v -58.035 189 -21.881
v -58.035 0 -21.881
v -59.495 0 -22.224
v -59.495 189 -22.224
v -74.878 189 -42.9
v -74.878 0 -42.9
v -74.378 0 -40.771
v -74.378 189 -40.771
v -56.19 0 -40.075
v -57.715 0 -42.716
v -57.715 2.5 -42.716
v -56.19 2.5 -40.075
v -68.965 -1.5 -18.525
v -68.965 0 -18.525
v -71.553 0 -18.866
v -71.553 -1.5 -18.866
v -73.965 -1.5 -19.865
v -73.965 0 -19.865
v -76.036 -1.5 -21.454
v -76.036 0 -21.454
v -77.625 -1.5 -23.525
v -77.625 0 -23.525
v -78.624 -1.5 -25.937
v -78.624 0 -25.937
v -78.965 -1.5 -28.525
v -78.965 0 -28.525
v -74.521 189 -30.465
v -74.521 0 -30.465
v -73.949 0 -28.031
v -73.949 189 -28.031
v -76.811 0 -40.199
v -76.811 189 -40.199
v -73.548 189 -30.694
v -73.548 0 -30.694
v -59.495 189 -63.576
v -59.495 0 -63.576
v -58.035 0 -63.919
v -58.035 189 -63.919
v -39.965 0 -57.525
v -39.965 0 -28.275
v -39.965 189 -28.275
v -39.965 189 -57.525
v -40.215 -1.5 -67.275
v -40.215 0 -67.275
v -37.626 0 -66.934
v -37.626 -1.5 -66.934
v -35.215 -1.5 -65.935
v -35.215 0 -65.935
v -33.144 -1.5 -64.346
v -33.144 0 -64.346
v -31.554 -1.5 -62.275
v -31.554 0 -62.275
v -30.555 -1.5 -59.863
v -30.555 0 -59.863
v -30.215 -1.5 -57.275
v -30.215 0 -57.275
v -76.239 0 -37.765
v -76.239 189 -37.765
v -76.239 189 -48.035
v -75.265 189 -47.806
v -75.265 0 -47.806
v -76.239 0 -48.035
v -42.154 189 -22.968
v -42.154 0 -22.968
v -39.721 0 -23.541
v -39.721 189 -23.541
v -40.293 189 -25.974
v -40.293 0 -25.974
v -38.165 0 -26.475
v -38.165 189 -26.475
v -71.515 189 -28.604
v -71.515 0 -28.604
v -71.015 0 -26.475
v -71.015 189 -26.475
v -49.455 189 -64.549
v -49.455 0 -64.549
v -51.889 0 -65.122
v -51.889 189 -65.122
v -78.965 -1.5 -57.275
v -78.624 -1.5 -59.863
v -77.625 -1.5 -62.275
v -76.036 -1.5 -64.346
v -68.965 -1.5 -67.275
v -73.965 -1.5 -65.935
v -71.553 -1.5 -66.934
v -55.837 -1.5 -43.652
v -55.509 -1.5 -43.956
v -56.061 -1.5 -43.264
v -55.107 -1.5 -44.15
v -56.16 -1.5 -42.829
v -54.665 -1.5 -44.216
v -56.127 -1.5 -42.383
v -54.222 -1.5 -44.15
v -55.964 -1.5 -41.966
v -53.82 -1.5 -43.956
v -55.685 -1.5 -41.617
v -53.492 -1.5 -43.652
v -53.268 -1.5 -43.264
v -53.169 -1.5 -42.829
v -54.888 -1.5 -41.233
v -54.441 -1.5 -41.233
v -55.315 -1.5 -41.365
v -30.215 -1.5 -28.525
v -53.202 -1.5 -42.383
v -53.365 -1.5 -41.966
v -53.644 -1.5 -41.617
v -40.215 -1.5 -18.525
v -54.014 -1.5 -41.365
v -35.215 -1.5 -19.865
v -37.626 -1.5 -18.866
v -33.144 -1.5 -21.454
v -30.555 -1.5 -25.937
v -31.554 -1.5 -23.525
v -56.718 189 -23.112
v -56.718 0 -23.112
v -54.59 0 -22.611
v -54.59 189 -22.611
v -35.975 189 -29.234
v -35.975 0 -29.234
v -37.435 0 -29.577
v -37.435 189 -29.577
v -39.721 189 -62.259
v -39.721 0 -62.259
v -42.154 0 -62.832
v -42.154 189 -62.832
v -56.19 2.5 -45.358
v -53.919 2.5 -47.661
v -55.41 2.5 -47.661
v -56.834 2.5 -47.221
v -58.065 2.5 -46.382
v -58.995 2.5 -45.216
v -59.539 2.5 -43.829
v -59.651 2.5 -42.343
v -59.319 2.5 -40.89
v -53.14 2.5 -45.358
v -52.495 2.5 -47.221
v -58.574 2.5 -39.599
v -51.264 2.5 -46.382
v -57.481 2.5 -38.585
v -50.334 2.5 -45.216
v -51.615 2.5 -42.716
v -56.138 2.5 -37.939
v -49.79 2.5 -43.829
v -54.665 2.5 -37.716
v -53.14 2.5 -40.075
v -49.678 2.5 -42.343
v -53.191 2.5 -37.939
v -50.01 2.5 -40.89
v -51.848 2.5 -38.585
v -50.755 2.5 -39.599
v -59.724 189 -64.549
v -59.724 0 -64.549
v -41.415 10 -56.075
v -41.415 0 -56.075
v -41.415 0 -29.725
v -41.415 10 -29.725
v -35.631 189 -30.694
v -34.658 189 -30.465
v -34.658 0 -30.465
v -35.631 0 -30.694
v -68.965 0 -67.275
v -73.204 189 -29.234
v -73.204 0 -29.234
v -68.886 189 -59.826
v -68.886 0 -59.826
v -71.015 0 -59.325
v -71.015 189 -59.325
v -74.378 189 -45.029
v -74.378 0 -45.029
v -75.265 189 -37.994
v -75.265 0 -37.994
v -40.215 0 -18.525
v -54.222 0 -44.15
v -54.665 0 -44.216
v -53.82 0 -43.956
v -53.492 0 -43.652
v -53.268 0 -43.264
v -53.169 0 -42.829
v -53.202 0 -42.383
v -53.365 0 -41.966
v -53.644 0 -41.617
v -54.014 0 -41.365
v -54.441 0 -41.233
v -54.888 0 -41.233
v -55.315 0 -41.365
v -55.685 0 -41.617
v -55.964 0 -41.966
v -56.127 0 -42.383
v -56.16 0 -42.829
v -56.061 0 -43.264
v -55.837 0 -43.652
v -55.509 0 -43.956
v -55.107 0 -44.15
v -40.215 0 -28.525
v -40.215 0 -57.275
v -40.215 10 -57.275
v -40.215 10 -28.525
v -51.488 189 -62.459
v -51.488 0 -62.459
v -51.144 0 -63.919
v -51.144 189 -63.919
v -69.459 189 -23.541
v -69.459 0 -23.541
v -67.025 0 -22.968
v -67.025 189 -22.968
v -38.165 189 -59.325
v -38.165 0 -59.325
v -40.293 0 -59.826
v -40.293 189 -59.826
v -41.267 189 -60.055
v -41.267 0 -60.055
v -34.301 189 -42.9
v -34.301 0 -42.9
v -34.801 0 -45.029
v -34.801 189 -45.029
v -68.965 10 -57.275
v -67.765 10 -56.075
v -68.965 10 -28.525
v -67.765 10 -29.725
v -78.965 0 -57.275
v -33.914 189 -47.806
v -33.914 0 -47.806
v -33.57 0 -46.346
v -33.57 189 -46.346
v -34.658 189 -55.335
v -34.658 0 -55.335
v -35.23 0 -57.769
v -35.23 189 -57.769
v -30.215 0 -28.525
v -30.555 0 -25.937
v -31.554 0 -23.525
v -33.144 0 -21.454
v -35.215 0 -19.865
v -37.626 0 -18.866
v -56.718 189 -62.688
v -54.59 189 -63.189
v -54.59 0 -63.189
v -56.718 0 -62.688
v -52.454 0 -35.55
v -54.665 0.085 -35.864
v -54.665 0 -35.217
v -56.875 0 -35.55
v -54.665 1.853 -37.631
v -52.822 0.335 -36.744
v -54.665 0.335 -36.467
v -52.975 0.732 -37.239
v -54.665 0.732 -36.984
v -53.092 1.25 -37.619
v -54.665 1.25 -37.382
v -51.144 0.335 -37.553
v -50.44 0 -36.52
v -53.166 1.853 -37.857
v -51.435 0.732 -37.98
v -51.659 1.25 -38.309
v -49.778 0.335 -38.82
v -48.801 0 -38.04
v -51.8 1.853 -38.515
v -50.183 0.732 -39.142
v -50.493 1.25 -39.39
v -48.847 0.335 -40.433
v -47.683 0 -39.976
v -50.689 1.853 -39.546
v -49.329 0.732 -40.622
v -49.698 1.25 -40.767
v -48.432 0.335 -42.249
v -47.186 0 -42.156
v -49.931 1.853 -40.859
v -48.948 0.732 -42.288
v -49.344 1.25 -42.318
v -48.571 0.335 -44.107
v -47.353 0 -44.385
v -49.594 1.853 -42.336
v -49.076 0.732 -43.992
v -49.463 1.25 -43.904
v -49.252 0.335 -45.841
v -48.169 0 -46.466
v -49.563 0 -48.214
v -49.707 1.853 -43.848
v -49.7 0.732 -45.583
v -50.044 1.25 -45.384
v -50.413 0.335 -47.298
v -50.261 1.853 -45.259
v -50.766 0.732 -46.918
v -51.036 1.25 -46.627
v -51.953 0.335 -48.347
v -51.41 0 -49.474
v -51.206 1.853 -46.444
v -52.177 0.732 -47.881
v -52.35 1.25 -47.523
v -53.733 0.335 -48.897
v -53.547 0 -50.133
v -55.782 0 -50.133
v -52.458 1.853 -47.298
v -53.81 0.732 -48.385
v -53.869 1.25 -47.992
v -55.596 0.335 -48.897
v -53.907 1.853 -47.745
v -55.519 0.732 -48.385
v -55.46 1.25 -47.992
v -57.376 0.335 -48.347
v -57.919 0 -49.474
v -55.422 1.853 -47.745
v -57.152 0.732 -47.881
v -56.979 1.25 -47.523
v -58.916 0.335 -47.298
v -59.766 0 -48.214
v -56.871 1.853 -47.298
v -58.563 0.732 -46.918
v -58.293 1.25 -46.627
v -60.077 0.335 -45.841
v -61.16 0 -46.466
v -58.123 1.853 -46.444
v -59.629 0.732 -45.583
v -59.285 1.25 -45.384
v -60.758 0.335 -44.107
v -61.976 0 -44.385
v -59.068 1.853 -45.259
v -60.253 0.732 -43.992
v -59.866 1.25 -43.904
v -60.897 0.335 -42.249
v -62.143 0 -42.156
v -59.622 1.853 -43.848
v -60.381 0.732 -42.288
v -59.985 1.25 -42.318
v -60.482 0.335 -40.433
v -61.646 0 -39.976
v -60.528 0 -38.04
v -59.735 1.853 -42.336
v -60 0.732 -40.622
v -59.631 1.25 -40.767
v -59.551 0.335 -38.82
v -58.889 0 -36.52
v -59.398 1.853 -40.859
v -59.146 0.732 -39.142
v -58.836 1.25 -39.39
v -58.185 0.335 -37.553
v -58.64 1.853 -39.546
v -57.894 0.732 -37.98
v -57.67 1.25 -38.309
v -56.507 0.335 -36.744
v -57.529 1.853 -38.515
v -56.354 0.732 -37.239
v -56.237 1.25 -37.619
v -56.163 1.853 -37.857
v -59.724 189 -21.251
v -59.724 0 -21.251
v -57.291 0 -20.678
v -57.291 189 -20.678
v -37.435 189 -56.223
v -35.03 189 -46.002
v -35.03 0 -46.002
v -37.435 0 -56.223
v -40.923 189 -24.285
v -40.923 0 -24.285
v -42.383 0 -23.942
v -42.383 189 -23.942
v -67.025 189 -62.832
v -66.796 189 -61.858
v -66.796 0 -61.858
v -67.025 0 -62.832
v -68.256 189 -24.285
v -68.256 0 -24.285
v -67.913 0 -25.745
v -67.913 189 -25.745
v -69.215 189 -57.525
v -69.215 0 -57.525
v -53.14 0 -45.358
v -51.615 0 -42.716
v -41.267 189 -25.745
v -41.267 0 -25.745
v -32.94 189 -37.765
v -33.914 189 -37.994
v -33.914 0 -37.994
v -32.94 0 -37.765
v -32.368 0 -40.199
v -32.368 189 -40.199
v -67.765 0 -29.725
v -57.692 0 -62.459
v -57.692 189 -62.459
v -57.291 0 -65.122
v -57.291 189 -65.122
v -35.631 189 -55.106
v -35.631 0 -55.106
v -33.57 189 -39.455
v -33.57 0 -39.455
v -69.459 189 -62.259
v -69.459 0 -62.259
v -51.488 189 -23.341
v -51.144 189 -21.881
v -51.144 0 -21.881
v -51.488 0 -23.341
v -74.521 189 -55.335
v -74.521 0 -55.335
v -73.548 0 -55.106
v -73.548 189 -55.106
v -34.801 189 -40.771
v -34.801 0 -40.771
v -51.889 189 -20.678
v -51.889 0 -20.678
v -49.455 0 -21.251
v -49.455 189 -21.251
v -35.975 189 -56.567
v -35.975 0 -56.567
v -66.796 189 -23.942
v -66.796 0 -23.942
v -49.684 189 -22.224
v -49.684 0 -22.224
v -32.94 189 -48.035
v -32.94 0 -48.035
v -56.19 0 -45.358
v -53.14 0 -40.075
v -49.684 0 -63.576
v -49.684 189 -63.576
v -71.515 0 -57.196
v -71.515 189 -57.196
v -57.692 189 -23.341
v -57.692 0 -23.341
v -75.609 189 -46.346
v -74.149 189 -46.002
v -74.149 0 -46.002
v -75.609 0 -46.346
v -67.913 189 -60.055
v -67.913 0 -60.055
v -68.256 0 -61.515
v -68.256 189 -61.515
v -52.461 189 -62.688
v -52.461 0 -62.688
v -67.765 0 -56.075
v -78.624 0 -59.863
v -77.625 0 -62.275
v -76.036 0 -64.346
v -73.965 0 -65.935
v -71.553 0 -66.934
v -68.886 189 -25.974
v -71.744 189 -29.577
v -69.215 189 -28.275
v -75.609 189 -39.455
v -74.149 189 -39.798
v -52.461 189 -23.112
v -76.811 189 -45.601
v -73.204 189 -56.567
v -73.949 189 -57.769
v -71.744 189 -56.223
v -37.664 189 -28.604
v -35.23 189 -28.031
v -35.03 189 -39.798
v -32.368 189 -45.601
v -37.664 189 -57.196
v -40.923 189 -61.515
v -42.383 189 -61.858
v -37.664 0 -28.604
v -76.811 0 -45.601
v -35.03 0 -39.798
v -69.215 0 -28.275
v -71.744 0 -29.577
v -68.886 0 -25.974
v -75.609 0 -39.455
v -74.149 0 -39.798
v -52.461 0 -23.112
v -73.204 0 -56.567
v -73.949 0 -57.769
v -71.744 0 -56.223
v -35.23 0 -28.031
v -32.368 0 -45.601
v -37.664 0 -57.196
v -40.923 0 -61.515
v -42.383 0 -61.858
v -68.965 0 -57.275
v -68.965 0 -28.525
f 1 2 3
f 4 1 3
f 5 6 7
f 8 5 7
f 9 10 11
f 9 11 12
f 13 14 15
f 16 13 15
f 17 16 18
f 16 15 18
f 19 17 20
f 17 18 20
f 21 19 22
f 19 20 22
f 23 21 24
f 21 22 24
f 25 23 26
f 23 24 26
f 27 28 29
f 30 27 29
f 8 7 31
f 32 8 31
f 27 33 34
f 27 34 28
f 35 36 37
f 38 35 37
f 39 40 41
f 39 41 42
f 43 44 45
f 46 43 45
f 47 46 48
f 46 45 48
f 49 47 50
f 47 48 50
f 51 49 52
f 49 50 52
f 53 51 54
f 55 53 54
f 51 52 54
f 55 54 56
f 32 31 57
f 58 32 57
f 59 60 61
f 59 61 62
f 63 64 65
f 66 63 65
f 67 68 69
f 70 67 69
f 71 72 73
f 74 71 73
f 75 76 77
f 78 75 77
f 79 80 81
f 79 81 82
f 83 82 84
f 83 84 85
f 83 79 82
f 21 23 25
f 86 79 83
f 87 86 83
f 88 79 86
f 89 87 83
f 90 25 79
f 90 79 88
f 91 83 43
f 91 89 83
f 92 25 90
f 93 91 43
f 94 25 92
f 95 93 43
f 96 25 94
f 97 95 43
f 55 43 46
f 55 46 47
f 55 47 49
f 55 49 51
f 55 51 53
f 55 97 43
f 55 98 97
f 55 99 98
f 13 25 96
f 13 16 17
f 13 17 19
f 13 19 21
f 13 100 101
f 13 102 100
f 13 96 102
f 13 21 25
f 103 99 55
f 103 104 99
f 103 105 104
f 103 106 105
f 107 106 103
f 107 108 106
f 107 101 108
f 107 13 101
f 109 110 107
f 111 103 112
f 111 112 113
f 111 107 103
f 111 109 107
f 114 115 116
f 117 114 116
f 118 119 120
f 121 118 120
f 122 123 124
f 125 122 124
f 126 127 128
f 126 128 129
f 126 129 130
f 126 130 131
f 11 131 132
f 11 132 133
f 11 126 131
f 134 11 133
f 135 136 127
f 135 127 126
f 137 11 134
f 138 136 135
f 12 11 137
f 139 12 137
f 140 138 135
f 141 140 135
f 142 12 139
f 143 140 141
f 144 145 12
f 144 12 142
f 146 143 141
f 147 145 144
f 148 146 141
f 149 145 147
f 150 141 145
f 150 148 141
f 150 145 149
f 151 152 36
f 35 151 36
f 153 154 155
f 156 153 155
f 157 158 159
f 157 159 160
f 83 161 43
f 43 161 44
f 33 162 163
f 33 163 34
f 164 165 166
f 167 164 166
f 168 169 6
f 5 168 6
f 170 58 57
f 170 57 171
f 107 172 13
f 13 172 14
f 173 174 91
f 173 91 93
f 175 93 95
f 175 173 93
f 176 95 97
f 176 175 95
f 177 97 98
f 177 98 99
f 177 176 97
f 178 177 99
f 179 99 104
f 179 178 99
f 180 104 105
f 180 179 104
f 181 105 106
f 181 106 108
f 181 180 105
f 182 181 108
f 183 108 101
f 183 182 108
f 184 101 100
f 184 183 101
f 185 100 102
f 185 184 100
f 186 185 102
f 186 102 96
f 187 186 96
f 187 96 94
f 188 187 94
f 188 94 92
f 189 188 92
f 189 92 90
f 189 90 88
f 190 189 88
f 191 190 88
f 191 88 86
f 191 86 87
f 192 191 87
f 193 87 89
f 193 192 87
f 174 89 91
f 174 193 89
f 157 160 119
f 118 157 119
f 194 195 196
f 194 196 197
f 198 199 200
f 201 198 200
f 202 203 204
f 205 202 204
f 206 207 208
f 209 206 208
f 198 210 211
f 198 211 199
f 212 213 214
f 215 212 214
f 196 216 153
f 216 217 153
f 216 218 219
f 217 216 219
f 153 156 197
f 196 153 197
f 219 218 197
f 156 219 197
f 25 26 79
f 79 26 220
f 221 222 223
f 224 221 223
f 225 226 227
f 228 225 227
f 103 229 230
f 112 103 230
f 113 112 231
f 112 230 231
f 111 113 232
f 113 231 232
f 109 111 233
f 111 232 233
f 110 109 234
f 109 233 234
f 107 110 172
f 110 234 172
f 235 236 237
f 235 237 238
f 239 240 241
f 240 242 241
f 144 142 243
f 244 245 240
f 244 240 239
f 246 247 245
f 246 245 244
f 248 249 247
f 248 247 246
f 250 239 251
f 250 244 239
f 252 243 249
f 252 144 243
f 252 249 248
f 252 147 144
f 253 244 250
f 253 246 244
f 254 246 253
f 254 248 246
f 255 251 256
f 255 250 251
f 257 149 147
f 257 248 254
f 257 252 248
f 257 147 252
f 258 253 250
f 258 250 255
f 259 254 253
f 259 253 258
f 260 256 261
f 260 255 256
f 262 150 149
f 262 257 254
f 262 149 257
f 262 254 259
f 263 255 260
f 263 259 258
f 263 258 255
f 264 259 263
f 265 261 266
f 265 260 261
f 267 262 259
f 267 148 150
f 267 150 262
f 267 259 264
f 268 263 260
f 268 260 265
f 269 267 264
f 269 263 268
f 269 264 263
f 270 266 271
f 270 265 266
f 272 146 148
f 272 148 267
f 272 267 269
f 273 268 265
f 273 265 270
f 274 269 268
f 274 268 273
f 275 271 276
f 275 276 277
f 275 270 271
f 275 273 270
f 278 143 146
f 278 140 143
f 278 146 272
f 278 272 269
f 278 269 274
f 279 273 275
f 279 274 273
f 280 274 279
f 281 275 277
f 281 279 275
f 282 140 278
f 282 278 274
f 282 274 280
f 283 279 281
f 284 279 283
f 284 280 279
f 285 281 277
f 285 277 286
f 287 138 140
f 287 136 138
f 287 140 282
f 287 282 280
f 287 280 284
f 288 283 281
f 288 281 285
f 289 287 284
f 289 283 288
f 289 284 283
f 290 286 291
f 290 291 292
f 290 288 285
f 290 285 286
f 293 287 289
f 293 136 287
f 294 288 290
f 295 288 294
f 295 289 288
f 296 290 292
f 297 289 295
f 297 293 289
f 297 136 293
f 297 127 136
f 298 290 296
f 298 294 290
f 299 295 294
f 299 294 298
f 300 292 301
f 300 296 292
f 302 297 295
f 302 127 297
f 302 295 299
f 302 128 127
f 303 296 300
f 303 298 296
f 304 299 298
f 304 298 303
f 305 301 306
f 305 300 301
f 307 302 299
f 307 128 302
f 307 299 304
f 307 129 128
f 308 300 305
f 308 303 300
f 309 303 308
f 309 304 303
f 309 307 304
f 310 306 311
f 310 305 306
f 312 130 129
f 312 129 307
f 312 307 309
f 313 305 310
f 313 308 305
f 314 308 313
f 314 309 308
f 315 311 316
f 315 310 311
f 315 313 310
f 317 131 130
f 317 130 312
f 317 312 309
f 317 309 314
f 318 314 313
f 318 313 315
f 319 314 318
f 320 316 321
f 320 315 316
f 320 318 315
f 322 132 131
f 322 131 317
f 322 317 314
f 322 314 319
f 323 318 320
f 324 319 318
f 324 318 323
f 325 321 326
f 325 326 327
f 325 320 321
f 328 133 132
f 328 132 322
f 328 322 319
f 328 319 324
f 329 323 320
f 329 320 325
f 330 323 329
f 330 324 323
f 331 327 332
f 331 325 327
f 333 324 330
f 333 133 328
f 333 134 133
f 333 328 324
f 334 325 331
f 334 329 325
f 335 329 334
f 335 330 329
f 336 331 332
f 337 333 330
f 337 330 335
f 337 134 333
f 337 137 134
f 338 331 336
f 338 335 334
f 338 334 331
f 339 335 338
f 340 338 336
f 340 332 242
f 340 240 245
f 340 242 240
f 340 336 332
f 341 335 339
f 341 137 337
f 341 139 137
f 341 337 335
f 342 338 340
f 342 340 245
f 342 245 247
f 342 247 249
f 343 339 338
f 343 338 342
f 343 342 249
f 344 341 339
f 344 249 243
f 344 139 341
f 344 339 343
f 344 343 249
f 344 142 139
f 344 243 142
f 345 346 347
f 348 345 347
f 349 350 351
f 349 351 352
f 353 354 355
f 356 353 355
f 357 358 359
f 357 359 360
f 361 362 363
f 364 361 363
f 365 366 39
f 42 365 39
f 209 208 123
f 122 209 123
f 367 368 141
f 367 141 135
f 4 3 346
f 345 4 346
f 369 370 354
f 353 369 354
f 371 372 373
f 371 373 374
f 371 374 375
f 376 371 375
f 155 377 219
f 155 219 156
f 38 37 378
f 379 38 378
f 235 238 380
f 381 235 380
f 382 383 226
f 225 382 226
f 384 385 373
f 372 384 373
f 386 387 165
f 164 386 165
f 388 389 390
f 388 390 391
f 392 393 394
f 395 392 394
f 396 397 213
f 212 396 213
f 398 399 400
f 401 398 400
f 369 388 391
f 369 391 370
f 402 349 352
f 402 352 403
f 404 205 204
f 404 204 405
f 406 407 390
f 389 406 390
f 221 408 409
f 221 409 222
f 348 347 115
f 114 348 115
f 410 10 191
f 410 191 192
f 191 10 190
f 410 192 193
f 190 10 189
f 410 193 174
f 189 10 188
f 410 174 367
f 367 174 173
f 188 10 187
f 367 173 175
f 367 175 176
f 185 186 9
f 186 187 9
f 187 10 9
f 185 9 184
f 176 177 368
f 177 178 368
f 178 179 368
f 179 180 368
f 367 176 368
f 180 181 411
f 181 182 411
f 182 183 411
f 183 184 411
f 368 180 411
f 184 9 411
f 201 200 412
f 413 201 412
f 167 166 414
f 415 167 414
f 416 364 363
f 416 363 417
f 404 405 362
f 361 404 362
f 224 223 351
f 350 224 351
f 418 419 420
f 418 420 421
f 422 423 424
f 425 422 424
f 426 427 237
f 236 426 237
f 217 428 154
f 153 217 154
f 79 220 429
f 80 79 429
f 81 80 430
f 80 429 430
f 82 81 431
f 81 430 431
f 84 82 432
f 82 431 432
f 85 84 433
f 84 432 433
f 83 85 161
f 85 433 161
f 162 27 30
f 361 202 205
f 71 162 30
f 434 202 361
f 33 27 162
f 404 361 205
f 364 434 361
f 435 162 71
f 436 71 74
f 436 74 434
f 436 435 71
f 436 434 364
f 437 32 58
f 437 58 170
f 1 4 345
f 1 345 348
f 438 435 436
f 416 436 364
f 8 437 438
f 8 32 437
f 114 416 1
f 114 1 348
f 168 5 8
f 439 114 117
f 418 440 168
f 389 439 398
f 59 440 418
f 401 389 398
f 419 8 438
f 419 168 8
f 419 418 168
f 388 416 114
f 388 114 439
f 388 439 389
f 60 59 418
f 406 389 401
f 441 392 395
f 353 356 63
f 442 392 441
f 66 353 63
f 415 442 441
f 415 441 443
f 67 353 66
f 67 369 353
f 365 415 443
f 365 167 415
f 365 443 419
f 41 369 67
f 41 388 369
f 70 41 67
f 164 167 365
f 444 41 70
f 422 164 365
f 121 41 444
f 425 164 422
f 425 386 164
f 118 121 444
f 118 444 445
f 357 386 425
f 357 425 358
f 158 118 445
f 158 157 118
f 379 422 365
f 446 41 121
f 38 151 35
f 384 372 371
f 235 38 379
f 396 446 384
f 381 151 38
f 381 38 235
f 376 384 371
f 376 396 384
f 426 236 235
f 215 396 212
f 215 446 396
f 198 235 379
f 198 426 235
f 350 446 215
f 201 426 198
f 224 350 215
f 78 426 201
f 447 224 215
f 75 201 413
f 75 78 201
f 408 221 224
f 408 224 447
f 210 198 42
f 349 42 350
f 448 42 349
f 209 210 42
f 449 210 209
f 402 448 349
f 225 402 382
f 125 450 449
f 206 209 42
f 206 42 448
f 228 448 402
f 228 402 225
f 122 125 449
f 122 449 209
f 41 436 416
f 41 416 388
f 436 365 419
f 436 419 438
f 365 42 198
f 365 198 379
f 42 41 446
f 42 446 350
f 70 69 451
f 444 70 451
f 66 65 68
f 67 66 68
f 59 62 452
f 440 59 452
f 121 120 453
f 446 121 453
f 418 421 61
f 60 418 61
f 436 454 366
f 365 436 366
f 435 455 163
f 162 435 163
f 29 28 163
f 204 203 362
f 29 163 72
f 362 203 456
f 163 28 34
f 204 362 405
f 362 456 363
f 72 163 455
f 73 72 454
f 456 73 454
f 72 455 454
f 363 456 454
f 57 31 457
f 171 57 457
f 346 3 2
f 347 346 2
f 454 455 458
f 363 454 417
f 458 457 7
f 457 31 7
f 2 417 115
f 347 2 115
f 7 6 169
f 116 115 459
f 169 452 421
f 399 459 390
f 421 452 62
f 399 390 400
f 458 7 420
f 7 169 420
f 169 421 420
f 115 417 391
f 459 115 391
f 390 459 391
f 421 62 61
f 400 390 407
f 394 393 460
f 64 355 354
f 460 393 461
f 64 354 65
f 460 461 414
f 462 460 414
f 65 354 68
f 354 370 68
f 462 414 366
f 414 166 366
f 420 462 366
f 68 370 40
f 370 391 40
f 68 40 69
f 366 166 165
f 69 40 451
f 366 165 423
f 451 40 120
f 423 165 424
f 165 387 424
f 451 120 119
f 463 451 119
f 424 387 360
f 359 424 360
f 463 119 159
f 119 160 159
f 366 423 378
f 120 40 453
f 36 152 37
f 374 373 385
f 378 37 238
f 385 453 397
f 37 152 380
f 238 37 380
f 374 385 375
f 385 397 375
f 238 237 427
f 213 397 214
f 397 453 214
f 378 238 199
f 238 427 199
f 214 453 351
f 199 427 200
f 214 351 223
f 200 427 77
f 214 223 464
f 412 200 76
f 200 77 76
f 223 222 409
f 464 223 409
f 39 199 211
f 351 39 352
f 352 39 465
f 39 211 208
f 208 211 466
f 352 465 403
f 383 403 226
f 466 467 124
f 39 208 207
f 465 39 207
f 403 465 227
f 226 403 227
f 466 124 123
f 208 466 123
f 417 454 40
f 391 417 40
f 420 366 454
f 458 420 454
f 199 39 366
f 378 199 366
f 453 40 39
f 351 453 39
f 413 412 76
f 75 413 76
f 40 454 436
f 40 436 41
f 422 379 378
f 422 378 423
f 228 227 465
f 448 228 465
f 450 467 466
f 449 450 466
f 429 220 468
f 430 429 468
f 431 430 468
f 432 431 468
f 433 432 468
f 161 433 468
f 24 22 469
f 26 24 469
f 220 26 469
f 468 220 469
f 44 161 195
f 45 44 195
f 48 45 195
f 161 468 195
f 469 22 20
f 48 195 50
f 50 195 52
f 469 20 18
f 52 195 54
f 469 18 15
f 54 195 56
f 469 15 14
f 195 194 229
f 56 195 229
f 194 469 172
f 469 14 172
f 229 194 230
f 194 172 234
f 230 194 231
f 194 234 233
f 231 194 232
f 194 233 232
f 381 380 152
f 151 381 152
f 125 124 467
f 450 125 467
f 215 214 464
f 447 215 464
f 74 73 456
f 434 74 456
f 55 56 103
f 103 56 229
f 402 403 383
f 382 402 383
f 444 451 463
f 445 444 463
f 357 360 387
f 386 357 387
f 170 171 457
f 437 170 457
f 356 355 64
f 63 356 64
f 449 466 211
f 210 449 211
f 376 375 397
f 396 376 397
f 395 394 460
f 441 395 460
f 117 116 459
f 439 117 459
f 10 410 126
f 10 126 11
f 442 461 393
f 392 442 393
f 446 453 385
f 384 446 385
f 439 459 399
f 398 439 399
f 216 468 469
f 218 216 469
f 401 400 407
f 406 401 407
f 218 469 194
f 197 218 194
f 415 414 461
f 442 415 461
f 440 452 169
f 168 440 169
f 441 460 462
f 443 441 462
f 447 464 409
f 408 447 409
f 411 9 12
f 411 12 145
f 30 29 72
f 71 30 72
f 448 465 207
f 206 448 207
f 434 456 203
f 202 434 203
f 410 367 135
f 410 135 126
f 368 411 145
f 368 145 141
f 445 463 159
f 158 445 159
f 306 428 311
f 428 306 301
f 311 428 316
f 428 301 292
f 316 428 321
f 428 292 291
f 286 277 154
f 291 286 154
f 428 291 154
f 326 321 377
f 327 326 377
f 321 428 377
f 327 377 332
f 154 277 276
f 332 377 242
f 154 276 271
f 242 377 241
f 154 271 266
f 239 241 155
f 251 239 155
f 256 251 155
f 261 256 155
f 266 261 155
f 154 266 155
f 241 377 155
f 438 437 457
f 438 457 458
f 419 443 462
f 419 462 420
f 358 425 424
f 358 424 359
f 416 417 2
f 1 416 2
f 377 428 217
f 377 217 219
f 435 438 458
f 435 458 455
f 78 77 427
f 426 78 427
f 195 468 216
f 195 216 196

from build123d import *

# Parameters (mm, degrees)
SKETCH1_W           = 29.25
SKETCH1_H           = 29.25
BOSS_EXTRUDE1_DEPTH = 189
SKETCH2_W           = 28.75
SKETCH2_H           = 28.75
SKETCH2_W_2         = 26.35
SKETCH2_H_2         = 26.35
BOSS_EXTRUDE2_DEPTH = 10
SKETCH3_R           = 1.5
BOSS_EXTRUDE3_DEPTH = 1.5
SKETCH4_R           = 5
BOSS_EXTRUDE4_DEPTH = 2.5
FILLET1_R           = 2.5


with BuildPart() as part:
    # Sketch1 → Boss-Extrude1 (new body)
    with BuildSketch(Plane(origin=(0, 0, 0), x_dir=(1, 0, 0), z_dir=(0, 1, 0))):
        Polygon((-74.377733291, 45.028603114), (-74.878463495, 42.900030733), (-74.377733291, 40.771458351), (-76.811304338, 40.198979568), (-76.238825555, 37.76540852), (-75.265397136, 37.994400034), (-75.608884406, 39.454542662), (-74.148741777, 39.798029932), (-71.744330888, 29.577031533), (-73.204473516, 29.233544263), (-73.547960786, 30.693686892), (-74.521389205, 30.464695378), (-73.948910422, 28.031124331), (-71.515339374, 28.603603114), (-71.01460917, 26.475030733), (-68.886036789, 25.974300529), (-69.458515572, 23.540729481), (-67.024944525, 22.968250698), (-66.795953011, 23.941679117), (-68.25609564, 24.285166387), (-67.91260837, 25.745309015), (-57.691609971, 23.340898126), (-58.035097241, 21.880755497), (-59.495239869, 22.224242767), (-59.724231382, 21.250814348), (-57.290660335, 20.678335565), (-56.718181552, 23.111906612), (-54.58960917, 22.611176408), (-52.461036789, 23.111906612), (-51.888558005, 20.678335565), (-49.454986958, 21.250814348), (-49.683978471, 22.224242767), (-51.1441211, 21.880755497), (-51.48760837, 23.340898126), (-41.266609971, 25.745309015), (-40.923122701, 24.285166387), (-42.383265329, 23.941679117), (-42.154273816, 22.968250698), (-39.720702769, 23.540729481), (-40.293181552, 25.974300529), (-38.16460917, 26.475030733), (-37.663878966, 28.603603114), (-35.230307919, 28.031124331), (-34.657829136, 30.464695378), (-35.631257555, 30.693686892), (-35.974744824, 29.233544263), (-37.434887453, 29.577031533), (-35.030476563, 39.798029932), (-33.570333935, 39.454542662), (-33.913821205, 37.994400034), (-32.940392786, 37.76540852), (-32.367914002, 40.198979568), (-34.80148505, 40.771458351), (-34.300754846, 42.900030733), (-34.80148505, 45.028603114), (-32.367914002, 45.601081897), (-32.940392786, 48.034652945), (-33.913821205, 47.805661431), (-33.570333935, 46.345518803), (-35.030476563, 46.002031533), (-37.434887453, 56.223029932), (-35.974744824, 56.566517202), (-35.631257555, 55.106374574), (-34.657829136, 55.335366087), (-35.230307919, 57.768937134), (-37.663878966, 57.196458351), (-38.16460917, 59.325030733), (-40.293181552, 59.825760937), (-39.720702769, 62.259331984), (-42.154273816, 62.831810767), (-42.383265329, 61.858382348), (-40.923122701, 61.514895078), (-41.266609971, 60.05475245), (-51.48760837, 62.45916334), (-51.1441211, 63.919305968), (-49.683978471, 63.575818698), (-49.454986958, 64.549247117), (-51.888558005, 65.1217259), (-52.461036789, 62.688154853), (-54.58960917, 63.188885057), (-56.718181552, 62.688154853), (-57.290660335, 65.1217259), (-59.724231382, 64.549247117), (-59.495239869, 63.575818698), (-58.035097241, 63.919305968), (-57.691609971, 62.45916334), (-67.91260837, 60.05475245), (-68.25609564, 61.514895078), (-66.795953011, 61.858382348), (-67.024944525, 62.831810767), (-69.458515572, 62.259331984), (-68.886036789, 59.825760937), (-71.01460917, 59.325030733), (-71.515339374, 57.196458351), (-73.948910422, 57.768937134), (-74.521389205, 55.335366087), (-73.547960786, 55.106374574), (-73.204473516, 56.566517202), (-71.744330888, 56.223029932), (-74.148741777, 46.002031533), (-75.608884406, 46.345518803), (-75.265397136, 47.805661431), (-76.238825555, 48.034652945), (-76.811304338, 45.601081897), align=None)
        with Locations((-54.58960917, 42.900030733)):
            Rectangle(SKETCH1_W, SKETCH1_H, mode=Mode.SUBTRACT)
    extrude(amount=BOSS_EXTRUDE1_DEPTH)


with BuildPart() as body_2:
    # Sketch2 → Boss-Extrude2 (new body)
    with BuildSketch(Plane.XZ):
        with Locations((-54.58960917, -42.900030733)):
            Rectangle(SKETCH2_W, SKETCH2_H)
        with Locations((-54.58960917, -42.900030733)):
            Rectangle(SKETCH2_W_2, SKETCH2_H_2, mode=Mode.SUBTRACT)
    extrude(amount=-BOSS_EXTRUDE2_DEPTH)

    # Sketch3 → Boss-Extrude3 (add)
    with BuildSketch(Plane.XZ):
        with BuildLine():
            Line((-68.96460917, -67.275030733), (-40.21460917, -67.275030733))
            ThreePointArc((-40.21460917, -67.275030733), (-33.143541358, -64.346098544), (-30.21460917, -57.275030733))
            Line((-30.21460917, -57.275030733), (-30.21460917, -28.525030733))
            ThreePointArc((-30.21460917, -28.525030733), (-33.143541358, -21.453962921), (-40.21460917, -18.525030733))
            Line((-40.21460917, -18.525030733), (-68.96460917, -18.525030733))
            ThreePointArc((-68.96460917, -18.525030733), (-76.035676982, -21.453962921), (-78.96460917, -28.525030733))
            Line((-78.96460917, -28.525030733), (-78.96460917, -57.275030733))
            ThreePointArc((-78.96460917, -57.275030733), (-76.035676982, -64.346098544), (-68.96460917, -67.275030733))
        make_face()
        with Locations(Location((-54.664503297, -42.716454345, 0), (0, 0, 270))):
            Circle(SKETCH3_R, mode=Mode.SUBTRACT)
    extrude(amount=BOSS_EXTRUDE3_DEPTH)

    # Sketch4 → Boss-Extrude4 (add)
    with BuildSketch(Plane(origin=(0, 0, 0), x_dir=(1, 0, 0), z_dir=(0, 1, 0))):
        with Locations(Location((-54.664503297, 42.716454345, 0), (0, 0, 270))):
            Circle(SKETCH4_R)
        Polygon((-51.614503297, 42.716454345), (-53.139503297, 45.357831827), (-56.189503297, 45.357831827), (-57.714503297, 42.716454345), (-56.189503297, 40.075076863), (-53.139503297, 40.075076863), align=None, mode=Mode.SUBTRACT)
    extrude(amount=BOSS_EXTRUDE4_DEPTH)

    # Fillet1
    fillet1_edges = [body_2.edges().sort_by_distance(p)[0] for p in [
        (-54.664503297, 0, -47.716454345),
    ]]
    fillet(fillet1_edges, radius=FILLET1_R - 0.0001)  # a hair under: the kernel refuses the full size


solid = Compound([part.part, body_2.part])
